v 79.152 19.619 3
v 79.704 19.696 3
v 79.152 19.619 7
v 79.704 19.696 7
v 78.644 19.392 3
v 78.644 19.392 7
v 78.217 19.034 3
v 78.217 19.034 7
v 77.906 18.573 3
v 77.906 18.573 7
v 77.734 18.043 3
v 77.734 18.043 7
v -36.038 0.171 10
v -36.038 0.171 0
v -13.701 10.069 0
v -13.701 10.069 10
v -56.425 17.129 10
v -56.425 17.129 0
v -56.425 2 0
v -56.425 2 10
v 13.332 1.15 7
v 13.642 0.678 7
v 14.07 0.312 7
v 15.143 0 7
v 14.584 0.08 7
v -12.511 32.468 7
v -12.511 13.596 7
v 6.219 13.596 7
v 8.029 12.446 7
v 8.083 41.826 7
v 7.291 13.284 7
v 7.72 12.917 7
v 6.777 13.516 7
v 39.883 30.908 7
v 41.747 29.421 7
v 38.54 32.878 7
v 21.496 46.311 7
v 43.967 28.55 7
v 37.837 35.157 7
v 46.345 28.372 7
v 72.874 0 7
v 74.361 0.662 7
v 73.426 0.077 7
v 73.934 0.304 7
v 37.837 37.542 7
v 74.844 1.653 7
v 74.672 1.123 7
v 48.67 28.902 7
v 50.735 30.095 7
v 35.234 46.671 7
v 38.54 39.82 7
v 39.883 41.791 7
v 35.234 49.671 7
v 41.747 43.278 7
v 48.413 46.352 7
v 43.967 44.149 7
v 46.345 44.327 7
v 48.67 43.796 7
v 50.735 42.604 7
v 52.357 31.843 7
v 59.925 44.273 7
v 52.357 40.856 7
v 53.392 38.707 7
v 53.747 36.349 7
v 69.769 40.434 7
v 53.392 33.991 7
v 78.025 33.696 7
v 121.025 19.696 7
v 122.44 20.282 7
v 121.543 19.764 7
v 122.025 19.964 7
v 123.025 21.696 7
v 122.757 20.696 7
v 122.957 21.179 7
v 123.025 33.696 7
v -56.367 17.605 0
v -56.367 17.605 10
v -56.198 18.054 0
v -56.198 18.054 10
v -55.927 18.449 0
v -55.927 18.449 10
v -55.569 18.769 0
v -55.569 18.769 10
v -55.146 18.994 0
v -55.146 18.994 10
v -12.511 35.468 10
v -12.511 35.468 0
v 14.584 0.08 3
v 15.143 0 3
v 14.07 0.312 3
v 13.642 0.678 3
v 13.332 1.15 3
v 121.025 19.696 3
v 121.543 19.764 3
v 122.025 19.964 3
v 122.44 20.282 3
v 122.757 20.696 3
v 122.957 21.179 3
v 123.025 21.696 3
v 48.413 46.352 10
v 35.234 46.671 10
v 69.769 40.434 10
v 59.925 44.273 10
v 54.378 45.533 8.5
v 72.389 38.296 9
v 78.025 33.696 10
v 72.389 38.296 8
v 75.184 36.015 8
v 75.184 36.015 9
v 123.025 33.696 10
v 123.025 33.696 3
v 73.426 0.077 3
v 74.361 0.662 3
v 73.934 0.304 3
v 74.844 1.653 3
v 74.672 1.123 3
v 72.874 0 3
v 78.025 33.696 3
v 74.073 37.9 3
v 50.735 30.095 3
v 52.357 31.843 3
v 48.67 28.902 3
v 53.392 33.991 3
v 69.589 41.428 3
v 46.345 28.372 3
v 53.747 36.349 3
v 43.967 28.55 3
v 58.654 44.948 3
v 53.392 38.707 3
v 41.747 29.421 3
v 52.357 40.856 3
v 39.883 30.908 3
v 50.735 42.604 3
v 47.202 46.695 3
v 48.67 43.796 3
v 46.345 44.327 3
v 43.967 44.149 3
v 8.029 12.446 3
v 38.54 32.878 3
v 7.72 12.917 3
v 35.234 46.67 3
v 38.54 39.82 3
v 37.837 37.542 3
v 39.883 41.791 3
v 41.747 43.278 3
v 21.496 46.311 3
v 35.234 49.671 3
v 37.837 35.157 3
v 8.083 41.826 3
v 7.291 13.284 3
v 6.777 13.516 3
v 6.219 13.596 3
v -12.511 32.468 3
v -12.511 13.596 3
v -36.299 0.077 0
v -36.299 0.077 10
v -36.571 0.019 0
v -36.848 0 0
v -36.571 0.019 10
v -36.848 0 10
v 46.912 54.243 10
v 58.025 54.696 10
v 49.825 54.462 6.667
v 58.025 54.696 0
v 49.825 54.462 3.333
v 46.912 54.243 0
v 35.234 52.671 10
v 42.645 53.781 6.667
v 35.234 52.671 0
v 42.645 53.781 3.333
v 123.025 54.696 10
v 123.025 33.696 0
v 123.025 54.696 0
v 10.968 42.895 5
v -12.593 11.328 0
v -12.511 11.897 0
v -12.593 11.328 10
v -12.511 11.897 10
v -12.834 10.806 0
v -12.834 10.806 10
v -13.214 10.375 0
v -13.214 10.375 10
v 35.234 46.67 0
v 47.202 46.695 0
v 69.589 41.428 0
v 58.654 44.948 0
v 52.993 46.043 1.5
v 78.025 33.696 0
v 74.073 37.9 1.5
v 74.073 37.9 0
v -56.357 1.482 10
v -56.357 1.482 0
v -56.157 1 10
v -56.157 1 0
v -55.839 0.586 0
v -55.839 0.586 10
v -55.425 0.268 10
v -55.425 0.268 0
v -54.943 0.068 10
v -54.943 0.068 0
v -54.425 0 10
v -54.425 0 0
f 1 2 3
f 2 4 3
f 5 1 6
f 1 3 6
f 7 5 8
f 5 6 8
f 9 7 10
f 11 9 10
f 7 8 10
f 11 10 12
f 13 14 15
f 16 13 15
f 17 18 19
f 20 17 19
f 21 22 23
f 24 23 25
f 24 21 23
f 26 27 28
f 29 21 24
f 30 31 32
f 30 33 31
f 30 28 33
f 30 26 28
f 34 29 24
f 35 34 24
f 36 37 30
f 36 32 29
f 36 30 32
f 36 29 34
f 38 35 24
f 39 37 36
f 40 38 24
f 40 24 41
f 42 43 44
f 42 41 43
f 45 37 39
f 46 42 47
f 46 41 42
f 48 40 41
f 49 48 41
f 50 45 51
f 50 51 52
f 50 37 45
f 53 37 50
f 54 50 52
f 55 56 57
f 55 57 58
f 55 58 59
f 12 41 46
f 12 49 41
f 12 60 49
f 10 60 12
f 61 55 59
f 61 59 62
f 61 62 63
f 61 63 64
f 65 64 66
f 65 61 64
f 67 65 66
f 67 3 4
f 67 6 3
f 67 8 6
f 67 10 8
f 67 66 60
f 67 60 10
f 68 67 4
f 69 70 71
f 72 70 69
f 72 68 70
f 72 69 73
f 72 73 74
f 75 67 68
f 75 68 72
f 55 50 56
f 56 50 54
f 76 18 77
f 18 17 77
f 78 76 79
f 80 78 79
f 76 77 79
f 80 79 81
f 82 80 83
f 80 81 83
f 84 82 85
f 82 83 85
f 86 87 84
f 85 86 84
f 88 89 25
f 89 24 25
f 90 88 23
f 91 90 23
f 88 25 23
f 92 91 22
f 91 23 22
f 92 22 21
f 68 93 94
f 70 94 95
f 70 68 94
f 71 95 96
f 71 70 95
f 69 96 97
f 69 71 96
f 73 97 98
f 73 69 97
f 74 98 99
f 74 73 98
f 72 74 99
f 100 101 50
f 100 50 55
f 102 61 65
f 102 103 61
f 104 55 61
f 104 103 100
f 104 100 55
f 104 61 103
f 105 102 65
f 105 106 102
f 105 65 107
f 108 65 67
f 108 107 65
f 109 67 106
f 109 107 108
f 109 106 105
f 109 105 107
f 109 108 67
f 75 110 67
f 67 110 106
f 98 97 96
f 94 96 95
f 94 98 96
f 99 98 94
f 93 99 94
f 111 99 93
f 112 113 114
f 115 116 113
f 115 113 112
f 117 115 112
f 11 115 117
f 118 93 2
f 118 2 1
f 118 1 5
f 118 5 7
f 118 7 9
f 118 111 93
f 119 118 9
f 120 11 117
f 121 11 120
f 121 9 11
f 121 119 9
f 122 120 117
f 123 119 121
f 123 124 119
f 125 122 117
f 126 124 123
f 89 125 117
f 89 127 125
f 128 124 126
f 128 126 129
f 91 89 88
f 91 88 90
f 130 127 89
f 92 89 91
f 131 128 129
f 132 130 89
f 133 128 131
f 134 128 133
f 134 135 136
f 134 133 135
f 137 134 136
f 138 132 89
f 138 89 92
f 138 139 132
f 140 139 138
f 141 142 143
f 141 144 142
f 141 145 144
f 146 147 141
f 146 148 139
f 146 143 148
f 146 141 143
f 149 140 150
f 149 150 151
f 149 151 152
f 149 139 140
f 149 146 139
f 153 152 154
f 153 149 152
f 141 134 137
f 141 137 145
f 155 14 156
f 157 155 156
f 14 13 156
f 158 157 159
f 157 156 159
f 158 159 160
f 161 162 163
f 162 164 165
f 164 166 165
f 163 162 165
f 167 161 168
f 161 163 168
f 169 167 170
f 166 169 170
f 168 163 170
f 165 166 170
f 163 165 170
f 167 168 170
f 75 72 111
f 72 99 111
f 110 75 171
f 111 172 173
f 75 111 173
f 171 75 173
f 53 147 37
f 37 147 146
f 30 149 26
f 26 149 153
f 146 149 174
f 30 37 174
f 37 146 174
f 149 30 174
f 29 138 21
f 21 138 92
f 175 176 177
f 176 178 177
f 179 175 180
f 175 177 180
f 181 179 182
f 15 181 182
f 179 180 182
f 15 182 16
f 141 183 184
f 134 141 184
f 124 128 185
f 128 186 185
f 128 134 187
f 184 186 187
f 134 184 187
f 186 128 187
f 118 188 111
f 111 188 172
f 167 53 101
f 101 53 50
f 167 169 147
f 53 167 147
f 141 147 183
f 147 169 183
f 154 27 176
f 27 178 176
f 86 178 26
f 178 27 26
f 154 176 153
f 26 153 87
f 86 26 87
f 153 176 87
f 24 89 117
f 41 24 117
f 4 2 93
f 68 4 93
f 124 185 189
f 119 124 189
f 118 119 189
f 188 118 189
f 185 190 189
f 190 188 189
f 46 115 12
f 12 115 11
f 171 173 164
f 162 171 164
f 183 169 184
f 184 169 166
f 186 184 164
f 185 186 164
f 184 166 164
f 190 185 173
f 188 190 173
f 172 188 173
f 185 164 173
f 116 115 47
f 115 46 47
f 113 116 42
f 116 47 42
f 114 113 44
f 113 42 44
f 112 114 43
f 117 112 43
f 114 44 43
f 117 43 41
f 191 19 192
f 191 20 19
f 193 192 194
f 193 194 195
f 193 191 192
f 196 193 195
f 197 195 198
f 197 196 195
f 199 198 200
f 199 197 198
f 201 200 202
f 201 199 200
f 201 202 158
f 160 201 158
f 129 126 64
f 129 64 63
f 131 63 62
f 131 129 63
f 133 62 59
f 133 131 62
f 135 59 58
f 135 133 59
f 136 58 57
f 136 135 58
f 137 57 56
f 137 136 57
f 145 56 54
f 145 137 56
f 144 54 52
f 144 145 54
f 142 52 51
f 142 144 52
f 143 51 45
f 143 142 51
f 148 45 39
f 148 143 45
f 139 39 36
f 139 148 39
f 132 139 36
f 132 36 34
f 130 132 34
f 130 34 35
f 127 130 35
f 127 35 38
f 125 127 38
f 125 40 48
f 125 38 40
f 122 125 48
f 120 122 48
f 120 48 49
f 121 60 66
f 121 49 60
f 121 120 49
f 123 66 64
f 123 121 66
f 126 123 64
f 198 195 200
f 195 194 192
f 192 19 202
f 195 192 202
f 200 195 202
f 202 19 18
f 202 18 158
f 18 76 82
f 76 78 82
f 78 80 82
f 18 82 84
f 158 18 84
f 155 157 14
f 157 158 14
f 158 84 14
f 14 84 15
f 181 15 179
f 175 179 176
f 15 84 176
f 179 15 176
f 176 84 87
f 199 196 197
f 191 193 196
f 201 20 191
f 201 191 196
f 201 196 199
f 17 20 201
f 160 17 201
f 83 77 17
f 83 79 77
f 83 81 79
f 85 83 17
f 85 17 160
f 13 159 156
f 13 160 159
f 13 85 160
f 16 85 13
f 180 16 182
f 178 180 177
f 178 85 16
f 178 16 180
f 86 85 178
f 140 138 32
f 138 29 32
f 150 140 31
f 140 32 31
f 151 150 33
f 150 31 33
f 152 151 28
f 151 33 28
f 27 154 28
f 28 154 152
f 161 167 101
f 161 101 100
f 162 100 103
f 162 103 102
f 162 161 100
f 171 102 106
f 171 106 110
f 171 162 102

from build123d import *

# Parameters (mm, degrees)
SKETCH_1_R          = 8
EXTRUDE_1_DEPTH     = 10
CUT_EXTRUDE_2_DEPTH = 3
CUT_EXTRUDE_3_DEPTH = 3
FILLET_1_R          = 2


with BuildPart() as part:
    # 草图1 → 凸台-拉伸1 (new body)
    with BuildSketch(Plane.XY):
        with BuildLine():
            Line((-56.424978154, 18.5), (-56.424978154, 0))
            Line((-56.424978154, 0), (-36.424978154, 0))
            Line((-36.424978154, 0), (-12.510711799, 10.595719206))
            Line((-12.510711799, 10.595719206), (-12.510711799, 13.595719206))
            Line((-12.510711799, 13.595719206), (7.489288201, 13.595719206))
            Line((7.489288201, 13.595719206), (13.872204282, 0))
            Line((13.872204282, 0), (74.552459824, 0))
            Line((74.552459824, 0), (78.025423377, 19.69615506))
            Line((78.025423377, 19.69615506), (123.025423377, 19.69615506))
            Line((123.025423377, 19.69615506), (123.025423377, 54.69615506))
            Line((123.025423377, 54.69615506), (58.025423377, 54.69615506))
            add(Edge.make_bspline(
                [(58.025423377, 54.69615506), (48.897941568, 54.692205697), (43.17687282, 53.988854745), (35.233696766, 52.670853795)],
                knots=[0, 0, 0, 0, 1, 1, 1, 1], degree=3))
            Line((35.233696766, 52.670853795), (35.233696766, 49.670853795))
            add(Edge.make_bspline(
                [(35.233696766, 49.670853795), (10.57425282, 44.720207412), (-12.510711799, 32.467844976)],
                knots=[0, 0, 0, 1, 1, 1], degree=2))
            Line((-12.510711799, 32.467844976), (-12.510711799, 35.467844976))
            Line((-12.510711799, 35.467844976), (-56.424978154, 18.5))
        make_face()
        with Locations((45.747275879, 36.3493933)):
            Circle(SKETCH_1_R, mode=Mode.SUBTRACT)
    extrude(amount=EXTRUDE_1_DEPTH)

    # 草图2 → 切除-拉伸2 (cut)
    with BuildSketch(Plane.XY.offset(10)):
        with BuildLine():
            Line((-12.510711799, 32.467844976), (-12.510711799, 13.595719206))
            Line((-12.510711799, 13.595719206), (7.489288201, 13.595719206))
            Line((7.489288201, 13.595719206), (13.872204282, 0))
            Line((13.872204282, 0), (74.552459824, 0))
            Line((74.552459824, 0), (78.025423377, 19.69615506))
            Line((78.025423377, 19.69615506), (123.025423377, 19.69615506))
            Line((123.025423377, 19.69615506), (123.025423377, 33.69615506))
            Line((123.025423377, 33.69615506), (78.025423377, 33.69615506))
            add(Edge.make_bspline(
                [(69.768901699, 40.433897673), (72.258439371, 38.402308014), (75.204387373, 35.998264258), (78.025423377, 33.69615506)],
                knots=[0, 0, 0, 0, 1, 1, 1, 1], degree=3))
            add(Edge.make_bspline(
                [(35.233696766, 46.670853795), (56.25429865, 47.512975461), (69.768901699, 40.433897673)],
                knots=[0, 0, 0, 1, 1, 1], degree=2))
            Line((35.233696766, 46.670853795), (35.233696766, 49.670853795))
            add(Edge.make_bspline(
                [(-12.510711799, 32.467844976), (10.107568712, 45.643152542), (35.233696766, 49.670853795)],
                knots=[0, 0, 0, 1, 1, 1], degree=2))
        make_face()
    extrude(amount=-CUT_EXTRUDE_2_DEPTH, mode=Mode.SUBTRACT)

    # 草图3 → 切除-拉伸3 (cut)
    with BuildSketch(Plane(origin=(0, 0, 0), x_dir=(-1, 0, 0), z_dir=(0, 0, -1))):
        with BuildLine():
            Line((-123.025423377, 19.69615506), (-78.025423377, 19.69615506))
            Line((-78.025423377, 19.69615506), (-74.552459824, 0))
            Line((-74.552459824, 0), (-13.872204282, 0))
            Line((-13.872204282, 0), (-7.489288201, 13.595719206))
            Line((-7.489288201, 13.595719206), (12.510711799, 13.595719206))
            Line((12.510711799, 13.595719206), (12.510711799, 32.467844976))
            add(Edge.make_bspline(
                [(-35.233696766, 49.670853795), (-9.646215757, 44.931714493), (12.510711799, 32.467844976)],
                knots=[0, 0, 0, 1, 1, 1], degree=2))
            Line((-35.233696766, 49.670853795), (-35.233696766, 46.670322435))
            add(Edge.make_bspline(
                [(-35.233696766, 46.670322435), (-53.573988888, 48.036148069), (-69.589003354, 41.428180454)],
                knots=[0, 0, 0, 1, 1, 1], degree=2))
            add(Edge.make_bspline(
                [(-69.589003354, 41.428180454), (-74.339147925, 38.238278194), (-78.025423377, 33.69615506)],
                knots=[0, 0, 0, 1, 1, 1], degree=2))
            Line((-78.025423377, 33.69615506), (-123.025423377, 33.69615506))
            Line((-123.025423377, 33.69615506), (-123.025423377, 19.69615506))
        make_face()
    extrude(amount=-CUT_EXTRUDE_3_DEPTH, mode=Mode.SUBTRACT)

    # 圆角1
    fillet_1_edges = [part.edges().sort_by_distance(p)[0] for p in [
        (-12.510711799, 10.595719206, 5),
        (-36.424978154, 0, 5),
        (-56.424978154, 0, 5),
        (-56.424978154, 18.5, 5),
        (123.025423377, 19.69615506, 5),
        (78.025423377, 19.69615506, 5),
        (74.552459824, 0, 5),
        (13.872204282, 0, 5),
        (7.489288201, 13.595719206, 5),
    ]]
    fillet(fillet_1_edges, radius=FILLET_1_R)


solid = part.part
